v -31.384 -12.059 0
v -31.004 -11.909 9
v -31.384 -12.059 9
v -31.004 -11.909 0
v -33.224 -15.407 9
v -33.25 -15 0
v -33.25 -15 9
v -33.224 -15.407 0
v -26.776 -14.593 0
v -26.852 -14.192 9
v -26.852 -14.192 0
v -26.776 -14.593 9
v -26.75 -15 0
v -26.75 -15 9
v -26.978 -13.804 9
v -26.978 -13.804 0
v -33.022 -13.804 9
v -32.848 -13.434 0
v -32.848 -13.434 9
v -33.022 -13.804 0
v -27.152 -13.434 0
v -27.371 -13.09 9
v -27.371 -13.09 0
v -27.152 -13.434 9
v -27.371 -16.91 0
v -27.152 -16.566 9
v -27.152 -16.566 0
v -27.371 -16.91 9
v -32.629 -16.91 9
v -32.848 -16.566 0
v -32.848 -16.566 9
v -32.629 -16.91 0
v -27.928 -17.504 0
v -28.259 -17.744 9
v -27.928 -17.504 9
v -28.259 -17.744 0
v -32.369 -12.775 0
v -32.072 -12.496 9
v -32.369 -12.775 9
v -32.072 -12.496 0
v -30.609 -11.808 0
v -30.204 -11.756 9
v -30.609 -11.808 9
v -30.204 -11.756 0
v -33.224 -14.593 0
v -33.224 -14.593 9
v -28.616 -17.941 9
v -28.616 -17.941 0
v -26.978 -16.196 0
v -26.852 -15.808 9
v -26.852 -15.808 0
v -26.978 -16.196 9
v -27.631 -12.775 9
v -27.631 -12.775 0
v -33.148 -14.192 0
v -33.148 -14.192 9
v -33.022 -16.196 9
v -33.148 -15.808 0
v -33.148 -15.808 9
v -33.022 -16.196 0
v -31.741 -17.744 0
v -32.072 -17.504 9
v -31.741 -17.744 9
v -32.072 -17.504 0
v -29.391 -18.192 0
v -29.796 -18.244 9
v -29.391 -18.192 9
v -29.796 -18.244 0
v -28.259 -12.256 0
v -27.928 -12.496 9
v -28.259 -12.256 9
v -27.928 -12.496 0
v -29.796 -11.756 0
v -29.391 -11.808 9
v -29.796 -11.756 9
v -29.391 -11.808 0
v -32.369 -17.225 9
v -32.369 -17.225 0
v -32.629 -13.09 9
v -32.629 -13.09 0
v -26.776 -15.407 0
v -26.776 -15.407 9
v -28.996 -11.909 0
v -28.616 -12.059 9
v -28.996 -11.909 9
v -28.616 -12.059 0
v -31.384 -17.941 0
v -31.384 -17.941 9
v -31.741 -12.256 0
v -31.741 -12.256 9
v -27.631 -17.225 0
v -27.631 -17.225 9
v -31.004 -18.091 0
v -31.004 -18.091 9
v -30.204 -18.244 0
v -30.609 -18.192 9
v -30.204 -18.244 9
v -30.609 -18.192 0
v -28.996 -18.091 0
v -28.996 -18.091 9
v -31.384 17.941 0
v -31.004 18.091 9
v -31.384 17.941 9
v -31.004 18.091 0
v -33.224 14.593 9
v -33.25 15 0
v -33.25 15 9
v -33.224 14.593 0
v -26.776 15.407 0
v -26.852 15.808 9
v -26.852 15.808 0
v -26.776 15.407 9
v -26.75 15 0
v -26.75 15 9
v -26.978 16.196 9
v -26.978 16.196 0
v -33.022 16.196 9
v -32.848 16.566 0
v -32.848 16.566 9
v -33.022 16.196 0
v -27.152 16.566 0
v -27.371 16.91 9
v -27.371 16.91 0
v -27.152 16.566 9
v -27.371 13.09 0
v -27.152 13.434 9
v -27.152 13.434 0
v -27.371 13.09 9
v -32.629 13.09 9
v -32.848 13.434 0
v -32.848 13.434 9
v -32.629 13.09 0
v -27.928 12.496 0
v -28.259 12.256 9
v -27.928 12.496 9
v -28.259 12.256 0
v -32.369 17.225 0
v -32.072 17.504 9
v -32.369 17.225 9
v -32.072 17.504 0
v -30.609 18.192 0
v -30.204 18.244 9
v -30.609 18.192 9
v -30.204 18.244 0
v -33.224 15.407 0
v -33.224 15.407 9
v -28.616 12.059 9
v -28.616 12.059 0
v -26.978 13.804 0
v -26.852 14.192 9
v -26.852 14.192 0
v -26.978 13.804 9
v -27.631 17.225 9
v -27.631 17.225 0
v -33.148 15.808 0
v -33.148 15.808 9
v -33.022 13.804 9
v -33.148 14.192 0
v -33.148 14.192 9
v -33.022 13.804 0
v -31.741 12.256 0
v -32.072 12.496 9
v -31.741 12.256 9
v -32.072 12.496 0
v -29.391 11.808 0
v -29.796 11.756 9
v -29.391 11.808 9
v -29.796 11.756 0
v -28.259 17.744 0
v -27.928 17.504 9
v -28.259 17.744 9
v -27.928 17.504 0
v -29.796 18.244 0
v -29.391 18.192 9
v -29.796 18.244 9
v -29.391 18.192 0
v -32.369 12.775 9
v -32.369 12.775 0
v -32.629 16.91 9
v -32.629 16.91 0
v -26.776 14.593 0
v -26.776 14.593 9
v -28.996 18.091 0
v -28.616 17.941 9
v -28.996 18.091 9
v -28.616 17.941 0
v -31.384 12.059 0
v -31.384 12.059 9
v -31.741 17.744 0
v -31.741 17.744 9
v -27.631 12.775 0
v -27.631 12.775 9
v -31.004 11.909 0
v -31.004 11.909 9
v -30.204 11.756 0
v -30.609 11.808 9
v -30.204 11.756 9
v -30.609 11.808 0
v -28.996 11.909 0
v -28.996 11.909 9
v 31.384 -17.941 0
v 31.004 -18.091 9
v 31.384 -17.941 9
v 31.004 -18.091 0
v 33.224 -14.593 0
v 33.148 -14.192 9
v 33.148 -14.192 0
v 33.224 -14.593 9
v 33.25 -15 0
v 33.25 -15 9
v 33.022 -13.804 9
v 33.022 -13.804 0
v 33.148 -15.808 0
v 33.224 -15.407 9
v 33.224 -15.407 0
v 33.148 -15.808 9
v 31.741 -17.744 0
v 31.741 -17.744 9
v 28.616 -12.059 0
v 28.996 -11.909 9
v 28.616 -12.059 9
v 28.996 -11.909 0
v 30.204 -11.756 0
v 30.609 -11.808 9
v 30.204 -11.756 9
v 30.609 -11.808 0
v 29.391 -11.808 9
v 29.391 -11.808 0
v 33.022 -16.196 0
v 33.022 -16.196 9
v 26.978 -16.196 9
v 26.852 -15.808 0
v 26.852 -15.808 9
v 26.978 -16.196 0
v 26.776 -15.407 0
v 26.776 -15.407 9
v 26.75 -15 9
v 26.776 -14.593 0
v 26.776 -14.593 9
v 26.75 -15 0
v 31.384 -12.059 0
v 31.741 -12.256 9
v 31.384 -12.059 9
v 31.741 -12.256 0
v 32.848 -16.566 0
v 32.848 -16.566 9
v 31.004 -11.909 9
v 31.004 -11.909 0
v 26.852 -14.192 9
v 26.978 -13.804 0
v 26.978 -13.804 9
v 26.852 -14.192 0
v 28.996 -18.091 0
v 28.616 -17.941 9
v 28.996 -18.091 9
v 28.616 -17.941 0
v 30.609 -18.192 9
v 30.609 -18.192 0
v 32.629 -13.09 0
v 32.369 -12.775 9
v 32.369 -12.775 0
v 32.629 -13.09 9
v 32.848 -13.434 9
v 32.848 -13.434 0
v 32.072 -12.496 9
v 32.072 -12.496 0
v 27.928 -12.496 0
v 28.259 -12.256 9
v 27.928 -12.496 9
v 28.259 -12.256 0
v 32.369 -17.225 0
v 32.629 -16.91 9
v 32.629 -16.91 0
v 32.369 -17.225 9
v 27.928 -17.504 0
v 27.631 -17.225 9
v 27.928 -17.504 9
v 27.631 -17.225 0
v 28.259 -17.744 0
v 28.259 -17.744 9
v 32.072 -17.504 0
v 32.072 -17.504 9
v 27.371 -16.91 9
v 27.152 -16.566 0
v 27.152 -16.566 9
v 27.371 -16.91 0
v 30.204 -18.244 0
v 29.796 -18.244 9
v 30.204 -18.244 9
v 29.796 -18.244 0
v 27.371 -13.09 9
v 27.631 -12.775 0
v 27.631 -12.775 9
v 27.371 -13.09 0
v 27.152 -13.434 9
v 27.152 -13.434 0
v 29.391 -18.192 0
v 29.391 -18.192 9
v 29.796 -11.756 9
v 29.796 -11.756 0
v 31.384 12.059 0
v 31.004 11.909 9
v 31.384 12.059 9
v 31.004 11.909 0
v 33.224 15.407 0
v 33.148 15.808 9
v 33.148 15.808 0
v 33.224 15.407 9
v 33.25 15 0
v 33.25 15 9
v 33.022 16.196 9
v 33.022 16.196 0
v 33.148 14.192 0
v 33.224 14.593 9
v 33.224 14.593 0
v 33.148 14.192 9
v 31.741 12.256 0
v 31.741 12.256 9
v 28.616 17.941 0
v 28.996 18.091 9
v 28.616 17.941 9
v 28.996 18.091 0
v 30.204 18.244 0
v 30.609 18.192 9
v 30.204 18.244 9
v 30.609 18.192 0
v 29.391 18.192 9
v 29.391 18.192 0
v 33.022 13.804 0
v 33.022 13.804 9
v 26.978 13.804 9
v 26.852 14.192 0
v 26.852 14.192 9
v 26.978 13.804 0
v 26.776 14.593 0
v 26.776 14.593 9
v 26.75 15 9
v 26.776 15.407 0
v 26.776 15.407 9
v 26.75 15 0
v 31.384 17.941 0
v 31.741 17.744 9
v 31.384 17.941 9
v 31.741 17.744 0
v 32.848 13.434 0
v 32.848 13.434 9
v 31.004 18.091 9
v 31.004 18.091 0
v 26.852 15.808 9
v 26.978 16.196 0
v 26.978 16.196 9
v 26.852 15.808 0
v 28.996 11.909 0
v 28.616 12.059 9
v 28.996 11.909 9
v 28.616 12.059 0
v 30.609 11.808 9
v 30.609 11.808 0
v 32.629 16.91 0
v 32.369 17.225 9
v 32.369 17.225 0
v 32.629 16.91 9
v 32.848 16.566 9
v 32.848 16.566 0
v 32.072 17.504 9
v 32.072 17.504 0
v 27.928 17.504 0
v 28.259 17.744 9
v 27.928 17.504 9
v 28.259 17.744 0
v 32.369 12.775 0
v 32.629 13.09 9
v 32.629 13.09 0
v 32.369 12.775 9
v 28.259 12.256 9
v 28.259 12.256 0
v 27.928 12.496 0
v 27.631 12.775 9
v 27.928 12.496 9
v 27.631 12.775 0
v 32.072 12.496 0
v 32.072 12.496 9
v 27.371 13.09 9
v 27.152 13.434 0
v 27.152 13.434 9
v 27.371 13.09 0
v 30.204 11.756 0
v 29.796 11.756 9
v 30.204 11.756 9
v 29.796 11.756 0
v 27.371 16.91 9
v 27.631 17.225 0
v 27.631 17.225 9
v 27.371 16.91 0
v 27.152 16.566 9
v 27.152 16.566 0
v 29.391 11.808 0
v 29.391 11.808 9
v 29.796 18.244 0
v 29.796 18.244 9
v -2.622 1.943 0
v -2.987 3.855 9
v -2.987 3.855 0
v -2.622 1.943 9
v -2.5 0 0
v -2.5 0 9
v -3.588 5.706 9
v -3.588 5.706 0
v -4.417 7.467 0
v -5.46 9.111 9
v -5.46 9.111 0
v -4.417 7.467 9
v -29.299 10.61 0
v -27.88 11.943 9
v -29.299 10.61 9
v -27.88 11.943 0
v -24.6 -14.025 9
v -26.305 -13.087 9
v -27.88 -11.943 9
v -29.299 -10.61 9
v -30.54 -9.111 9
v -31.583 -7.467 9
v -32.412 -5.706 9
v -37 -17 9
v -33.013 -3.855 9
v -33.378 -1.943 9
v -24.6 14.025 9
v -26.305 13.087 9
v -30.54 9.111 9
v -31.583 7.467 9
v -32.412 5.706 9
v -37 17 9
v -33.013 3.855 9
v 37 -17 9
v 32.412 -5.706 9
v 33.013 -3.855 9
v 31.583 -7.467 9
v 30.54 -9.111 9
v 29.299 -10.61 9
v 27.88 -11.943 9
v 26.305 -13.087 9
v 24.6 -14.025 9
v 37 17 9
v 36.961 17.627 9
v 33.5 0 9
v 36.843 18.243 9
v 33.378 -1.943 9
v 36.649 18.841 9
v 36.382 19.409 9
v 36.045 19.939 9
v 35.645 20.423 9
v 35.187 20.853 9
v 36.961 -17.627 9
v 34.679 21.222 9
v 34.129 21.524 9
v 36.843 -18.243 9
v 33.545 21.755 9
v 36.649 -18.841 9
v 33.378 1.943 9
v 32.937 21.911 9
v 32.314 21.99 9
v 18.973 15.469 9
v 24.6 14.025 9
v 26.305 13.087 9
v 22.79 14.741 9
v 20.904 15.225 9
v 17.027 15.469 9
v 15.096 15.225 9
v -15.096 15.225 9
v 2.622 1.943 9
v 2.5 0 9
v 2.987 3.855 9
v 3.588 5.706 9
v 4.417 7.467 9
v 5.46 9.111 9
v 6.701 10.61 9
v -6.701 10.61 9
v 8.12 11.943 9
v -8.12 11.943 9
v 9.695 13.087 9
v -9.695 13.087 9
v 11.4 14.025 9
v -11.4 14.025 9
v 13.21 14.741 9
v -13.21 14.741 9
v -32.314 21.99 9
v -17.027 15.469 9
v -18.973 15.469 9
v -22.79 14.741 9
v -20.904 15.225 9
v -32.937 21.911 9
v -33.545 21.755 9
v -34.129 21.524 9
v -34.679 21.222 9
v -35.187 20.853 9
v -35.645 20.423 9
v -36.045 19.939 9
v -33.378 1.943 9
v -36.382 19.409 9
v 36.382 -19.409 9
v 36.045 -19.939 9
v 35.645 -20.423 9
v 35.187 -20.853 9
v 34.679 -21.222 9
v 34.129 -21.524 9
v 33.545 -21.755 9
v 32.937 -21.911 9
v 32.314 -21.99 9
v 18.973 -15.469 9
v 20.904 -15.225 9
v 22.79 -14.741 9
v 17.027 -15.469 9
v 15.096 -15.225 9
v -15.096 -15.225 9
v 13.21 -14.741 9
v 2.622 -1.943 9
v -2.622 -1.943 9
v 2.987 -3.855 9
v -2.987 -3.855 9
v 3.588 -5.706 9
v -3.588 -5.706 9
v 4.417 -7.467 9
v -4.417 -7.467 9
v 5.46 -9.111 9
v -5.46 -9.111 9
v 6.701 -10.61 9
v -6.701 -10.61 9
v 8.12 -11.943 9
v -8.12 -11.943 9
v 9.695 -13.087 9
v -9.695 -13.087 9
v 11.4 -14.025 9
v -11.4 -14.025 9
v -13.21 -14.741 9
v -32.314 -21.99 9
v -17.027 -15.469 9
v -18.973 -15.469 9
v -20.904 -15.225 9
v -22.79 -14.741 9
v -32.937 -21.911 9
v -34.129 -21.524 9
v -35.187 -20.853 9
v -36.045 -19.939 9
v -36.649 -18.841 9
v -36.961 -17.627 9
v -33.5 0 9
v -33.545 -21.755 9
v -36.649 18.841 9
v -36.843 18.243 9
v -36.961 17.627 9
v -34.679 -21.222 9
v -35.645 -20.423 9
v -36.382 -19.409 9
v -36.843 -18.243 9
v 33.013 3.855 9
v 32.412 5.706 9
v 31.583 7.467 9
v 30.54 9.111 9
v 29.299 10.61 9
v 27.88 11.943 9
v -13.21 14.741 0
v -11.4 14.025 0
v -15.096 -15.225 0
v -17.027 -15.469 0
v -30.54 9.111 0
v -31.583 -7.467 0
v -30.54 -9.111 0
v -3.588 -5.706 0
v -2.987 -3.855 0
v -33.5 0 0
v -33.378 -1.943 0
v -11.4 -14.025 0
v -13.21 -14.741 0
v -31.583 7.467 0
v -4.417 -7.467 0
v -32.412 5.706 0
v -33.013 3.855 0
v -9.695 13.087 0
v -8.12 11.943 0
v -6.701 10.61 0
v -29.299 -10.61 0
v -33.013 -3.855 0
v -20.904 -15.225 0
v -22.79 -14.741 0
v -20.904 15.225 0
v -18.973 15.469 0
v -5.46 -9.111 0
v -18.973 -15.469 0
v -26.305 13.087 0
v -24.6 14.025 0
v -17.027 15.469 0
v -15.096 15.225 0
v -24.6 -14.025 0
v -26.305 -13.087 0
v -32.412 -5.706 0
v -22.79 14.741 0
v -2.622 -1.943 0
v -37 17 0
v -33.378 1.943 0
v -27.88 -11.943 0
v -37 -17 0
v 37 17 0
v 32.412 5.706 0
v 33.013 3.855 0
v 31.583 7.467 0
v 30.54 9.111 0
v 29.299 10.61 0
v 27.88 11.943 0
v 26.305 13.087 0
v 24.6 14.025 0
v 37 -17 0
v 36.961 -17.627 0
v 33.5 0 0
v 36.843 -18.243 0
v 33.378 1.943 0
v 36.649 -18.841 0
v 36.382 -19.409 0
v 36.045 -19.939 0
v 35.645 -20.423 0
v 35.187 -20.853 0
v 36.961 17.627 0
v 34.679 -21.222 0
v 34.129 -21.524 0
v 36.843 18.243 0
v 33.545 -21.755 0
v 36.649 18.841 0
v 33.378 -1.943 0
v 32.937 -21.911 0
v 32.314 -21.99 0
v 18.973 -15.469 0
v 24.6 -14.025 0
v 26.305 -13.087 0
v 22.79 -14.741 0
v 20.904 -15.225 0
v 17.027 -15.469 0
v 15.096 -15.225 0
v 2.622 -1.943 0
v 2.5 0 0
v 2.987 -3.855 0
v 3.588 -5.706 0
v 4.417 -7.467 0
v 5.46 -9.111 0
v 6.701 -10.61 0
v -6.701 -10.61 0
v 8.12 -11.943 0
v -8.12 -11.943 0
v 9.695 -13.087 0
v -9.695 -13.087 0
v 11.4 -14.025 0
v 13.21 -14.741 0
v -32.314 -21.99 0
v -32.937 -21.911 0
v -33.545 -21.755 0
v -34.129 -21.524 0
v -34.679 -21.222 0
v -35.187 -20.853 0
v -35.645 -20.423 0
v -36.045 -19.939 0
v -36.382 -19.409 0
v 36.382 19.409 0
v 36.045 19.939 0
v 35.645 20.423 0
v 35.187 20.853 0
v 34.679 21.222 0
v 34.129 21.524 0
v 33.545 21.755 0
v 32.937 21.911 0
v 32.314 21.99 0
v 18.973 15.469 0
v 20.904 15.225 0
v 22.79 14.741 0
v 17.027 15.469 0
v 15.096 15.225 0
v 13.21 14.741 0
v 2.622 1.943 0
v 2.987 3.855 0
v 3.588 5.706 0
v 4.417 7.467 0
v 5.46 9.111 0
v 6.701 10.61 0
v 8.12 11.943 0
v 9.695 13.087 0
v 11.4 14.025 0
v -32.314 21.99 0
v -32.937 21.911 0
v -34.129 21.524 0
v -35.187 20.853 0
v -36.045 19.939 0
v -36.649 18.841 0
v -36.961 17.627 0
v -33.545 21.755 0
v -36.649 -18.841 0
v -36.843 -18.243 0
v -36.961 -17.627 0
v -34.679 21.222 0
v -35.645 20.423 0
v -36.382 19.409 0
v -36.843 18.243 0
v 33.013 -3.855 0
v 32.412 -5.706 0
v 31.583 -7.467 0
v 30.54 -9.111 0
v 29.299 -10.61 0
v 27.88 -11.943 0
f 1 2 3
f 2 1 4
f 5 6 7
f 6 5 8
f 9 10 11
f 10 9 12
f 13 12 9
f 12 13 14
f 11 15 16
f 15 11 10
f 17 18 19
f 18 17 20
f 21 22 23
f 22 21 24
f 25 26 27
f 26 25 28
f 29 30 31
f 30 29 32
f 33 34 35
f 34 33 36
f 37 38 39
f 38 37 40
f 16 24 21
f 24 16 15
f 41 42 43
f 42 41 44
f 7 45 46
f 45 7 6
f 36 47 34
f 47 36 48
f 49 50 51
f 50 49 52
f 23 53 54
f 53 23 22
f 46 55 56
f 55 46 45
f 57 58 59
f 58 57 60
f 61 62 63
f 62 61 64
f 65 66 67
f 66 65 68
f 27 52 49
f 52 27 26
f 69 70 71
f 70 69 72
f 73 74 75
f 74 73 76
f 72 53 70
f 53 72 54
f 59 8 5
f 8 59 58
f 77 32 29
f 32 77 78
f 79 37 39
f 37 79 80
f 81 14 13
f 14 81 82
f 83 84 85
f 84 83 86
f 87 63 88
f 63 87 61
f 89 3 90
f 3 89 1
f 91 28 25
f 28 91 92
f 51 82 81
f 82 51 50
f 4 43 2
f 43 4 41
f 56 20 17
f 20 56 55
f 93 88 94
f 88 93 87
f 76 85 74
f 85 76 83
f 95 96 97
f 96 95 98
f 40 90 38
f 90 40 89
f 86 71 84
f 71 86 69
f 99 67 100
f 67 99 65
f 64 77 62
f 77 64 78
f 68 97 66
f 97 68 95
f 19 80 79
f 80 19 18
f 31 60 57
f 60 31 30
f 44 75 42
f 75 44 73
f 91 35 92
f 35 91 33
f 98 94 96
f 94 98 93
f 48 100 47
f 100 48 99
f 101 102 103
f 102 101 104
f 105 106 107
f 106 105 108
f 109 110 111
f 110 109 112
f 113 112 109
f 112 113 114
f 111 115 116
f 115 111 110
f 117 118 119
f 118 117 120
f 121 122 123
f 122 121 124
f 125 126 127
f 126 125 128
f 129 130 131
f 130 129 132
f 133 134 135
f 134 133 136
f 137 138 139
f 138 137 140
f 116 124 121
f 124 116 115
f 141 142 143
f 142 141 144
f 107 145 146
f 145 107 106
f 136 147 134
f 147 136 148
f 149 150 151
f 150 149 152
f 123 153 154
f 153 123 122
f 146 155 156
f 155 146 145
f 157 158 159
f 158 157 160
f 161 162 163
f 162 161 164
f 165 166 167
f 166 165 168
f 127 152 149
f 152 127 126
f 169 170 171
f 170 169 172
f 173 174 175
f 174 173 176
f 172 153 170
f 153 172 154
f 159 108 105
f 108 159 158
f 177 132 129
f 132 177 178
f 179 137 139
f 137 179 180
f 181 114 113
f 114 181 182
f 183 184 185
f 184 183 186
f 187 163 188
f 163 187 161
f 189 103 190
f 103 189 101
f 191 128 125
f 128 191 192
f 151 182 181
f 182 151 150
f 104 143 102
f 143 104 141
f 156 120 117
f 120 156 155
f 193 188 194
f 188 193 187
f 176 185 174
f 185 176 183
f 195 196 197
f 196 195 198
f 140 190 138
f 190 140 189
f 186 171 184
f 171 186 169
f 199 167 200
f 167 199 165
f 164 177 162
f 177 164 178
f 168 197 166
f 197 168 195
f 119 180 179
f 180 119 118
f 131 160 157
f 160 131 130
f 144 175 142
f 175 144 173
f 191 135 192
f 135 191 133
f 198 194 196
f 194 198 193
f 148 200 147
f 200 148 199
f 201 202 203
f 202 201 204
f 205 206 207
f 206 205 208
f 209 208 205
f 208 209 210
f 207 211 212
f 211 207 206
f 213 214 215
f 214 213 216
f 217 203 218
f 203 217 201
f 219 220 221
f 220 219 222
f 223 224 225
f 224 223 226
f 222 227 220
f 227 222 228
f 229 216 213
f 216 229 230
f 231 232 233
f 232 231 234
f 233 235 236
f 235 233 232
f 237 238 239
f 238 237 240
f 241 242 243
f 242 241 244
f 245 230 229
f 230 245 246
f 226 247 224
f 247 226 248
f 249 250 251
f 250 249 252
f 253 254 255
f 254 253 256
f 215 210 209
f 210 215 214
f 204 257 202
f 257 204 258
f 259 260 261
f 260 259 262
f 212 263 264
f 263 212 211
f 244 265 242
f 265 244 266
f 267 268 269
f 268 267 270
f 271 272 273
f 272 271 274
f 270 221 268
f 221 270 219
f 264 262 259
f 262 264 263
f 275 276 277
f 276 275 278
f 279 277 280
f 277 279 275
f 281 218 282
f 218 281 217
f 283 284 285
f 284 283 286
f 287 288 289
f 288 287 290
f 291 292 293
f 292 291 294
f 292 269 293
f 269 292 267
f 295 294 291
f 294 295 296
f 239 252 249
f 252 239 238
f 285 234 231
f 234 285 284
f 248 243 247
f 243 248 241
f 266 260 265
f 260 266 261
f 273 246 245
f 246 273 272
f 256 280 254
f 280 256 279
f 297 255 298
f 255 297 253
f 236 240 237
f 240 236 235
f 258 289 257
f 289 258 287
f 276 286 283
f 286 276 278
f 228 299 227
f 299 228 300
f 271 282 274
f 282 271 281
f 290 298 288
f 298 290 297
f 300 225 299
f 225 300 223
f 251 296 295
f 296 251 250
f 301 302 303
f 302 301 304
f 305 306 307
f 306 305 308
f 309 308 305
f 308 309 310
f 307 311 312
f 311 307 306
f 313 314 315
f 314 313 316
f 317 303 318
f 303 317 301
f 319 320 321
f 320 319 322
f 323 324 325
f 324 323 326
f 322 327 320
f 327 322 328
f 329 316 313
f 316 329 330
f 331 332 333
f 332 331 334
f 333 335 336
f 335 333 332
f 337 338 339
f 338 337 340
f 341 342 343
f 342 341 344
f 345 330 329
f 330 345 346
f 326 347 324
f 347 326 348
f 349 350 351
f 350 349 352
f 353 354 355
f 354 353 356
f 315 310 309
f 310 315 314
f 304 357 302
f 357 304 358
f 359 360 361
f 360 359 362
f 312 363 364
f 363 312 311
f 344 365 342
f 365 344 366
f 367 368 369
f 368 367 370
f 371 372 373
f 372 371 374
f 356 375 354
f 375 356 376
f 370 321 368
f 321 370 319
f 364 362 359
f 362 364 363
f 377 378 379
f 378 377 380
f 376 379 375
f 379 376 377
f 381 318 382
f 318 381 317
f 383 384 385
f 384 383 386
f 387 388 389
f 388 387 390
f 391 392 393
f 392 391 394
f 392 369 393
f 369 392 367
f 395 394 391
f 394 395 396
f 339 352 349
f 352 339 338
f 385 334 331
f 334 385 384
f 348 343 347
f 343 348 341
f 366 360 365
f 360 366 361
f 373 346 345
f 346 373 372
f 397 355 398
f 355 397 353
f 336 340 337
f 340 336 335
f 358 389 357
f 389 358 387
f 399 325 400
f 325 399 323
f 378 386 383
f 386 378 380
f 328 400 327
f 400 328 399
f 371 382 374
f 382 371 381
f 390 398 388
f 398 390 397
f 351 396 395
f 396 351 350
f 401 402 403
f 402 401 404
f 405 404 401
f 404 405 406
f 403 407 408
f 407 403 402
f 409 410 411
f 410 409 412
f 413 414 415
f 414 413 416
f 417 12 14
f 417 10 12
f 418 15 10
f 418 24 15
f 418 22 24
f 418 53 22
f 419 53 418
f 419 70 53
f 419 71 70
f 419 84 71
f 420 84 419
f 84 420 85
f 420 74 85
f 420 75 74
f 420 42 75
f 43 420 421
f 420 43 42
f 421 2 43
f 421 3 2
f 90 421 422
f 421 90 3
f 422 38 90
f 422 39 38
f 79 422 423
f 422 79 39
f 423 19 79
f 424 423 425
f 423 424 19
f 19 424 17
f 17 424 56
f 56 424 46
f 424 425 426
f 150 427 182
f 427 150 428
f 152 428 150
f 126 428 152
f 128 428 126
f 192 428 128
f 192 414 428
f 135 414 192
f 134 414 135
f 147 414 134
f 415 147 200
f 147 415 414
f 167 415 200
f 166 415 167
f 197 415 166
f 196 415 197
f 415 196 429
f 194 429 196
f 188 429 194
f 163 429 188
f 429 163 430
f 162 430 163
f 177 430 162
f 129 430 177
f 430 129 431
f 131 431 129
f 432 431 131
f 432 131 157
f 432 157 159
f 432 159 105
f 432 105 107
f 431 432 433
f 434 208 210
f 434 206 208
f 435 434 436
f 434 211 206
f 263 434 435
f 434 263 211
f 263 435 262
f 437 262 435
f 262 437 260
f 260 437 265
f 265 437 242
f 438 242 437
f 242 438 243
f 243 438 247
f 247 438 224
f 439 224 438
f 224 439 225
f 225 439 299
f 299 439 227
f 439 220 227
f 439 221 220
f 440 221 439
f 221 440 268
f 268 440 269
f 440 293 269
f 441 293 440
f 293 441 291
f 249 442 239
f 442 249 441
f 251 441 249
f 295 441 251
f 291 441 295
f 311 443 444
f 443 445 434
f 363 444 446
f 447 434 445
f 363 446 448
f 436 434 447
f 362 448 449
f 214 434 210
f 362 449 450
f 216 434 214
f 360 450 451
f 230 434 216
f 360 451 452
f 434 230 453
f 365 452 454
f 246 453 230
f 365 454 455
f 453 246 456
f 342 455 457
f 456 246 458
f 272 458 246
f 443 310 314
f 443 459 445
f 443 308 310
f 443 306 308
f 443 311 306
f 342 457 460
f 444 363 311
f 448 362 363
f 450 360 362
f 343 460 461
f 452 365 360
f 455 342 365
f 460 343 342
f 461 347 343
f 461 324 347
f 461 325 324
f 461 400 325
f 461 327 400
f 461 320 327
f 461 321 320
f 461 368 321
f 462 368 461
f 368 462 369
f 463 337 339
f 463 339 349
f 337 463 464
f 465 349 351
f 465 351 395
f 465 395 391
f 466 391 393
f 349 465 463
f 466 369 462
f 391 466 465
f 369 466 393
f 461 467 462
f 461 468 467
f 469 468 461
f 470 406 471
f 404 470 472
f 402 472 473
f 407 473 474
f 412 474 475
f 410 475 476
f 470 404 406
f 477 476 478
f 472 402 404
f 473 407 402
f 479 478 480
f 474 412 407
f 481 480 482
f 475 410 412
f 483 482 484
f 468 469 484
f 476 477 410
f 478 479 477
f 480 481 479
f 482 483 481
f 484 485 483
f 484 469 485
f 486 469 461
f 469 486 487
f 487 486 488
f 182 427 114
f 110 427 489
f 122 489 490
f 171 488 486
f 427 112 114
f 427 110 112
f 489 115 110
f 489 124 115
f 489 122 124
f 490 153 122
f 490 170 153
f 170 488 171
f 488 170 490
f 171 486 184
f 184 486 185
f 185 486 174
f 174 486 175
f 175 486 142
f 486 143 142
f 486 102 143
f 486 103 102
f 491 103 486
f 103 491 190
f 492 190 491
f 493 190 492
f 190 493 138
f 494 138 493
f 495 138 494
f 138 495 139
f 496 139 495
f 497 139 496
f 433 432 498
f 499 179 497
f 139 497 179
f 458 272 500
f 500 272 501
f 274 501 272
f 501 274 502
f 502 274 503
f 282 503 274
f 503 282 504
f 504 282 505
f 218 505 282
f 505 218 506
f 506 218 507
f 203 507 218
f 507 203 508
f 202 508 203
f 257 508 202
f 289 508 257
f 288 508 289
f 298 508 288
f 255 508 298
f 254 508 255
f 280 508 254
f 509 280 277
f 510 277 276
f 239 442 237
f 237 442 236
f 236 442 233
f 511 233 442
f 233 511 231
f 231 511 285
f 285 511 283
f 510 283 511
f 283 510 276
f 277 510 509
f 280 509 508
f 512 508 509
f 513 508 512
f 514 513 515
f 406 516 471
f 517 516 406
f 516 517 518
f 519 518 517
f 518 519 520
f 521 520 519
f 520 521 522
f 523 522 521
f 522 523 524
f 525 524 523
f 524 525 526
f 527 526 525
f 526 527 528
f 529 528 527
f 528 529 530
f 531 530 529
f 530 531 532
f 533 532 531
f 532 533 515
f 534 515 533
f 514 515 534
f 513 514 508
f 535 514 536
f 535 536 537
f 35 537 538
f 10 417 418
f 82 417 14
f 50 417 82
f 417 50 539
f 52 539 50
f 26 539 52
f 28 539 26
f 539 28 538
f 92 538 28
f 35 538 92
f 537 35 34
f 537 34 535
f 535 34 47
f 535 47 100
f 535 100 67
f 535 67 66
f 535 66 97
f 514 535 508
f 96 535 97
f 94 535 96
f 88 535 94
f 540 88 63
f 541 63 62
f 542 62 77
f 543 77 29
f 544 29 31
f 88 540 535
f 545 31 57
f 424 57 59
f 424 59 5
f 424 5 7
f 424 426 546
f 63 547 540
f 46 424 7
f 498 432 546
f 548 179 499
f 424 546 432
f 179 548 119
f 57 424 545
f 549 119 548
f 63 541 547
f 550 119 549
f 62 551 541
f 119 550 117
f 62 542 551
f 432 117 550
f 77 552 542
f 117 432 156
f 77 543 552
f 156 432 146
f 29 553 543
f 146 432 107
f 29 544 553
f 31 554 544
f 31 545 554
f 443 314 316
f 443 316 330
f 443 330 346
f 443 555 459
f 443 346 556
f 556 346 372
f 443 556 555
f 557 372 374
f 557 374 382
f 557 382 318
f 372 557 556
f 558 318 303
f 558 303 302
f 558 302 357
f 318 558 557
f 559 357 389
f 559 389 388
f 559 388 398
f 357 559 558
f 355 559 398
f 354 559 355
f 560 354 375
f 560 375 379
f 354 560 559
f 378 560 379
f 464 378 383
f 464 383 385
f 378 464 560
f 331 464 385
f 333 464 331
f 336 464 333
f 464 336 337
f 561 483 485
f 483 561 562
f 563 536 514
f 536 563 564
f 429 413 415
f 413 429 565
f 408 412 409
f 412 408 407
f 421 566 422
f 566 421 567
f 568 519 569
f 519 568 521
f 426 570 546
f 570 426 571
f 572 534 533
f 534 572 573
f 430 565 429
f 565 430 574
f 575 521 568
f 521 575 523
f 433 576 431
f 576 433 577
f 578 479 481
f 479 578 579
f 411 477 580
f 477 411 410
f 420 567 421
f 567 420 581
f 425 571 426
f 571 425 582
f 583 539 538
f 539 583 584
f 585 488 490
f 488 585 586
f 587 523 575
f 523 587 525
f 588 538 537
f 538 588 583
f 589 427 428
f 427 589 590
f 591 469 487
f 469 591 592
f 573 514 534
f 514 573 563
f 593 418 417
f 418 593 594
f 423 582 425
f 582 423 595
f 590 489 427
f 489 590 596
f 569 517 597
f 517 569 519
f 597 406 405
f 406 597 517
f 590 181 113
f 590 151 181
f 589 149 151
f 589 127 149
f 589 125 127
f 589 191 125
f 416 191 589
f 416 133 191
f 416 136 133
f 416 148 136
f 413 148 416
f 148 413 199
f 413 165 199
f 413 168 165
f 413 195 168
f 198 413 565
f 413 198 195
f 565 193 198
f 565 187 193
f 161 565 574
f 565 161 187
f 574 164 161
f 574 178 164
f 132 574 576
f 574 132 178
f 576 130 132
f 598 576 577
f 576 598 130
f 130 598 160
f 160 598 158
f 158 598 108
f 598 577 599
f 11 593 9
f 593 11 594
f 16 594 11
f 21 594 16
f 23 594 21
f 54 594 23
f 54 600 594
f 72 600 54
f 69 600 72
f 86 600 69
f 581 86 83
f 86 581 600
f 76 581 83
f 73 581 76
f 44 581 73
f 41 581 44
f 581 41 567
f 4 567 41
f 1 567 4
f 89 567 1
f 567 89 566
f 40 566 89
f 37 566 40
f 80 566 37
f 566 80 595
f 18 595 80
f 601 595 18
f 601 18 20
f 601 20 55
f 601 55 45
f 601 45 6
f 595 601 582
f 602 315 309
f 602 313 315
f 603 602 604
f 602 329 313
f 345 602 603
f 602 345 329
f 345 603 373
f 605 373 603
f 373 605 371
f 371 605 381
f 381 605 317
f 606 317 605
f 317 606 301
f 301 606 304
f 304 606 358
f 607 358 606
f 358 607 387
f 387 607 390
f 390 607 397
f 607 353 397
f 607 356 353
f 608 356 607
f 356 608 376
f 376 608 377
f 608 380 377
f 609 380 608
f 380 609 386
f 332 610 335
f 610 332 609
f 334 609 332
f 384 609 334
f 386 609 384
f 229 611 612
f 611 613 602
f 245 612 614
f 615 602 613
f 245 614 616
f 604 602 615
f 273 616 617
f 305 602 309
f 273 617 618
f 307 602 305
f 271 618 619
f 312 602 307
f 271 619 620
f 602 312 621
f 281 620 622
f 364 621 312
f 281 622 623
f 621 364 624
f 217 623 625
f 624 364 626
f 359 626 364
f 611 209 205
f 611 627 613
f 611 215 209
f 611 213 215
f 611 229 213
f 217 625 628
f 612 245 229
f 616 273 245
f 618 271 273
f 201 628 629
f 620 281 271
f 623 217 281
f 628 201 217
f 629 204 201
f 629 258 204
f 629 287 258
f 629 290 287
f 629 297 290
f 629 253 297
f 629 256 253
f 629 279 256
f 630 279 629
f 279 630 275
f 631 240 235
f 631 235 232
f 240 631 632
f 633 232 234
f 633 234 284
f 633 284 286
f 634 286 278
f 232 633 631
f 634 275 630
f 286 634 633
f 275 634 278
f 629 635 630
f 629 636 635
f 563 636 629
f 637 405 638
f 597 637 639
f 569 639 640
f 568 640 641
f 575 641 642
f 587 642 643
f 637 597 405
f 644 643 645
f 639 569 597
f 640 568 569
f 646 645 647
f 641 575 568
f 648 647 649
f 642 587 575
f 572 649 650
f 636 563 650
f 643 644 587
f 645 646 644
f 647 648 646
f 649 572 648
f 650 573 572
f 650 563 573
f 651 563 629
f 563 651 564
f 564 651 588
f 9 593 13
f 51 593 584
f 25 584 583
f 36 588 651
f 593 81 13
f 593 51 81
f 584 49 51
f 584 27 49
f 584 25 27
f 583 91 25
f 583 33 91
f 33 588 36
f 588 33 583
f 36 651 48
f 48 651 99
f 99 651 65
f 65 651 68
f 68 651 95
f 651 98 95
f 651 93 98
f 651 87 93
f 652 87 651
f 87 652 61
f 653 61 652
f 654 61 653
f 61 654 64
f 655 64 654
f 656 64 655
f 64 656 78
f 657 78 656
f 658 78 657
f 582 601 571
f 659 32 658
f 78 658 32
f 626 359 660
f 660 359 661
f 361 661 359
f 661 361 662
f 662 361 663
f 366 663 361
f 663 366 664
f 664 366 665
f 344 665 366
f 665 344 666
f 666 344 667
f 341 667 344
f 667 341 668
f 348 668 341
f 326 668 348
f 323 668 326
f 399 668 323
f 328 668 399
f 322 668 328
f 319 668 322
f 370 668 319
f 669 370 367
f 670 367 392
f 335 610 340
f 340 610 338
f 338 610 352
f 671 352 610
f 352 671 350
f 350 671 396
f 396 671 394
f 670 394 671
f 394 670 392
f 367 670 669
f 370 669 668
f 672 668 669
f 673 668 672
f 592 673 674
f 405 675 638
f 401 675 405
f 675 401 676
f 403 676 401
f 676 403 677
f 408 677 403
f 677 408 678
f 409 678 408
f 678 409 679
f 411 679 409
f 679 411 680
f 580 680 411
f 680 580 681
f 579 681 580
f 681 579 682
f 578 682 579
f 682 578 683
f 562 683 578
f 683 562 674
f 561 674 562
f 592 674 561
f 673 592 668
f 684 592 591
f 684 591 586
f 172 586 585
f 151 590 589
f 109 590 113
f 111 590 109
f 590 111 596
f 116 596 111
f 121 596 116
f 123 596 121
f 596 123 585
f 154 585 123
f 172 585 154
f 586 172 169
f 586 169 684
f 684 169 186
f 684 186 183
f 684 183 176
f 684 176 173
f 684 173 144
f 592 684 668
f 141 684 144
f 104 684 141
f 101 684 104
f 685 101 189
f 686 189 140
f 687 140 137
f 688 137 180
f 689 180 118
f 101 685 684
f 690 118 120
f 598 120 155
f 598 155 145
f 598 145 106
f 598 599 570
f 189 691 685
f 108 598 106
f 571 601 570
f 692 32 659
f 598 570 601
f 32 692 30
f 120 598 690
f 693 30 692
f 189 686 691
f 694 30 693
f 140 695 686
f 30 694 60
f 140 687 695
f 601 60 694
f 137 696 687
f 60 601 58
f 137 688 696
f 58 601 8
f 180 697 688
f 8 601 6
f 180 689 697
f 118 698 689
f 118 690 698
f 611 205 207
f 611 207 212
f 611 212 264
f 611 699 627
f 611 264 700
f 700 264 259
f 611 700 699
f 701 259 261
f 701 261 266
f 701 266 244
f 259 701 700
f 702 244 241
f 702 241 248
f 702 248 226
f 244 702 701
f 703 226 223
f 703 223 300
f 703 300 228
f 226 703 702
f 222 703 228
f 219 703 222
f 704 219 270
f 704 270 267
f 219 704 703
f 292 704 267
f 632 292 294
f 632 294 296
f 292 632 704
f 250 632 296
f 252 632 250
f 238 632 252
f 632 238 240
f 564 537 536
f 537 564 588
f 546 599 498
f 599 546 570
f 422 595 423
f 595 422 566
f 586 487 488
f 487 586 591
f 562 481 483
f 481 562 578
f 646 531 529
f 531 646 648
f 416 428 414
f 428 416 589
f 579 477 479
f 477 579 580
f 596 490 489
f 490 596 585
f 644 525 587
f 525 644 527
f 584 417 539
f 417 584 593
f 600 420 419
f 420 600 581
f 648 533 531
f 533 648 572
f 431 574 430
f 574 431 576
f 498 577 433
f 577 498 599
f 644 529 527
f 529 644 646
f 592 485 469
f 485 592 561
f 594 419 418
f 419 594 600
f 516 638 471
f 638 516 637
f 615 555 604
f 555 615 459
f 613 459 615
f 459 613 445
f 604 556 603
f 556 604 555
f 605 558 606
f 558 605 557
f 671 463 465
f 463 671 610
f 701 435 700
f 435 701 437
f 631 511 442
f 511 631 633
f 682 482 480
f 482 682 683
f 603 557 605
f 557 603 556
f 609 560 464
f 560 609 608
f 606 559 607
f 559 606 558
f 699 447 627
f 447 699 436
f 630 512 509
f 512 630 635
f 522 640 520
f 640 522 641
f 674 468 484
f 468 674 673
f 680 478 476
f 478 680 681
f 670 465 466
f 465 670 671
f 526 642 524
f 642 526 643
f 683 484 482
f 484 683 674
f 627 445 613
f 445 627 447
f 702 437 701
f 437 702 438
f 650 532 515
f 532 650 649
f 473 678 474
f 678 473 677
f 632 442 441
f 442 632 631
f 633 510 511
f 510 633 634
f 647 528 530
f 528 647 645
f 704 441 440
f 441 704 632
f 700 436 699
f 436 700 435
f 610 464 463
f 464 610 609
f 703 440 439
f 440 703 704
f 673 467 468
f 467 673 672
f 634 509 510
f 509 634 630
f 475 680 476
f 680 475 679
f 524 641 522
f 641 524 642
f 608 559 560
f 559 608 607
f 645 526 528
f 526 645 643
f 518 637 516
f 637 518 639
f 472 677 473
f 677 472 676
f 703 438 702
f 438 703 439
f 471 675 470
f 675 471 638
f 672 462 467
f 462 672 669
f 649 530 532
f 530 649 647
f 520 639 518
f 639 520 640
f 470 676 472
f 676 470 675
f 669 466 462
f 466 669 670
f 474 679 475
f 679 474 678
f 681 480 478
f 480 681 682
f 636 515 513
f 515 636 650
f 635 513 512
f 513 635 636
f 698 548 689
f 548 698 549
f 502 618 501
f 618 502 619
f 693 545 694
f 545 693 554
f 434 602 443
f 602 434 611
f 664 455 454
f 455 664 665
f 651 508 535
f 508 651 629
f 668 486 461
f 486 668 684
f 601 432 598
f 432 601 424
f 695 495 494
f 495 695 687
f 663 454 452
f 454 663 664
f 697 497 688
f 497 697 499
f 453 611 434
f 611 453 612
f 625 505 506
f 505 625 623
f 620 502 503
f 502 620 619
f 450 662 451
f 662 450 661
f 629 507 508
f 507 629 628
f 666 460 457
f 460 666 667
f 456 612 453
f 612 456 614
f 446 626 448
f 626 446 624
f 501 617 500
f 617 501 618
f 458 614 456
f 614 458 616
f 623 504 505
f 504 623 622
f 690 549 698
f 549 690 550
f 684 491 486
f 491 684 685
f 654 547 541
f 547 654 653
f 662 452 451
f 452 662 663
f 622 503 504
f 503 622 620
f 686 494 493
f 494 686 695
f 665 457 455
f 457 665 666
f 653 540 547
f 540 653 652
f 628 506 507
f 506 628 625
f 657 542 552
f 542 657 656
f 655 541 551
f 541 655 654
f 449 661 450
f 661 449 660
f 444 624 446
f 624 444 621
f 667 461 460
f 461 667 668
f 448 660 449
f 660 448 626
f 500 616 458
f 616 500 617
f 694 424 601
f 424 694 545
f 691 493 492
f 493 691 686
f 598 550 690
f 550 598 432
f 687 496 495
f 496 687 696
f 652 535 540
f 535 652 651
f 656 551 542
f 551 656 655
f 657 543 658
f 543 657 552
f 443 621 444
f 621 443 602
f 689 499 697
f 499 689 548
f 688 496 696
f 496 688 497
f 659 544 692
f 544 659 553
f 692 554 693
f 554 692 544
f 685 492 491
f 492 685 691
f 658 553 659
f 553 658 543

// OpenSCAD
$fn = 50;

difference() {
	union() {
		hull() {
			translate(v = [-32.0, 17.0, 0]) {
				cylinder(h = 9, r = 5);
			}
			translate(v = [32.0, 17.0, 0]) {
				cylinder(h = 9, r = 5);
			}
			translate(v = [-32.0, -17.0, 0]) {
				cylinder(h = 9, r = 5);
			}
			translate(v = [32.0, -17.0, 0]) {
				cylinder(h = 9, r = 5);
			}
		}
	}
	union() {
		translate(v = [-30.0, -15.0, -100.0]) {
			cylinder(h = 200, r = 3.25);
		}
		translate(v = [-30.0, 15.0, -100.0]) {
			cylinder(h = 200, r = 3.25);
		}
		translate(v = [30.0, -15.0, -100.0]) {
			cylinder(h = 200, r = 3.25);
		}
		translate(v = [30.0, 15.0, -100.0]) {
			cylinder(h = 200, r = 3.25);
		}
		translate(v = [-30.0, -15.0, -100.0]) {
			cylinder(h = 200, r = 1.8);
		}
		translate(v = [-30.0, 15.0, -100.0]) {
			cylinder(h = 200, r = 1.8);
		}
		translate(v = [30.0, -15.0, -100.0]) {
			cylinder(h = 200, r = 1.8);
		}
		translate(v = [30.0, 15.0, -100.0]) {
			cylinder(h = 200, r = 1.8);
		}
		translate(v = [-18.0, 0, 0.0]) {
			cylinder(h = 9, r = 15.5);
		}
		translate(v = [18.0, 0, 0.0]) {
			cylinder(h = 9, r = 15.5);
		}
	}
}
